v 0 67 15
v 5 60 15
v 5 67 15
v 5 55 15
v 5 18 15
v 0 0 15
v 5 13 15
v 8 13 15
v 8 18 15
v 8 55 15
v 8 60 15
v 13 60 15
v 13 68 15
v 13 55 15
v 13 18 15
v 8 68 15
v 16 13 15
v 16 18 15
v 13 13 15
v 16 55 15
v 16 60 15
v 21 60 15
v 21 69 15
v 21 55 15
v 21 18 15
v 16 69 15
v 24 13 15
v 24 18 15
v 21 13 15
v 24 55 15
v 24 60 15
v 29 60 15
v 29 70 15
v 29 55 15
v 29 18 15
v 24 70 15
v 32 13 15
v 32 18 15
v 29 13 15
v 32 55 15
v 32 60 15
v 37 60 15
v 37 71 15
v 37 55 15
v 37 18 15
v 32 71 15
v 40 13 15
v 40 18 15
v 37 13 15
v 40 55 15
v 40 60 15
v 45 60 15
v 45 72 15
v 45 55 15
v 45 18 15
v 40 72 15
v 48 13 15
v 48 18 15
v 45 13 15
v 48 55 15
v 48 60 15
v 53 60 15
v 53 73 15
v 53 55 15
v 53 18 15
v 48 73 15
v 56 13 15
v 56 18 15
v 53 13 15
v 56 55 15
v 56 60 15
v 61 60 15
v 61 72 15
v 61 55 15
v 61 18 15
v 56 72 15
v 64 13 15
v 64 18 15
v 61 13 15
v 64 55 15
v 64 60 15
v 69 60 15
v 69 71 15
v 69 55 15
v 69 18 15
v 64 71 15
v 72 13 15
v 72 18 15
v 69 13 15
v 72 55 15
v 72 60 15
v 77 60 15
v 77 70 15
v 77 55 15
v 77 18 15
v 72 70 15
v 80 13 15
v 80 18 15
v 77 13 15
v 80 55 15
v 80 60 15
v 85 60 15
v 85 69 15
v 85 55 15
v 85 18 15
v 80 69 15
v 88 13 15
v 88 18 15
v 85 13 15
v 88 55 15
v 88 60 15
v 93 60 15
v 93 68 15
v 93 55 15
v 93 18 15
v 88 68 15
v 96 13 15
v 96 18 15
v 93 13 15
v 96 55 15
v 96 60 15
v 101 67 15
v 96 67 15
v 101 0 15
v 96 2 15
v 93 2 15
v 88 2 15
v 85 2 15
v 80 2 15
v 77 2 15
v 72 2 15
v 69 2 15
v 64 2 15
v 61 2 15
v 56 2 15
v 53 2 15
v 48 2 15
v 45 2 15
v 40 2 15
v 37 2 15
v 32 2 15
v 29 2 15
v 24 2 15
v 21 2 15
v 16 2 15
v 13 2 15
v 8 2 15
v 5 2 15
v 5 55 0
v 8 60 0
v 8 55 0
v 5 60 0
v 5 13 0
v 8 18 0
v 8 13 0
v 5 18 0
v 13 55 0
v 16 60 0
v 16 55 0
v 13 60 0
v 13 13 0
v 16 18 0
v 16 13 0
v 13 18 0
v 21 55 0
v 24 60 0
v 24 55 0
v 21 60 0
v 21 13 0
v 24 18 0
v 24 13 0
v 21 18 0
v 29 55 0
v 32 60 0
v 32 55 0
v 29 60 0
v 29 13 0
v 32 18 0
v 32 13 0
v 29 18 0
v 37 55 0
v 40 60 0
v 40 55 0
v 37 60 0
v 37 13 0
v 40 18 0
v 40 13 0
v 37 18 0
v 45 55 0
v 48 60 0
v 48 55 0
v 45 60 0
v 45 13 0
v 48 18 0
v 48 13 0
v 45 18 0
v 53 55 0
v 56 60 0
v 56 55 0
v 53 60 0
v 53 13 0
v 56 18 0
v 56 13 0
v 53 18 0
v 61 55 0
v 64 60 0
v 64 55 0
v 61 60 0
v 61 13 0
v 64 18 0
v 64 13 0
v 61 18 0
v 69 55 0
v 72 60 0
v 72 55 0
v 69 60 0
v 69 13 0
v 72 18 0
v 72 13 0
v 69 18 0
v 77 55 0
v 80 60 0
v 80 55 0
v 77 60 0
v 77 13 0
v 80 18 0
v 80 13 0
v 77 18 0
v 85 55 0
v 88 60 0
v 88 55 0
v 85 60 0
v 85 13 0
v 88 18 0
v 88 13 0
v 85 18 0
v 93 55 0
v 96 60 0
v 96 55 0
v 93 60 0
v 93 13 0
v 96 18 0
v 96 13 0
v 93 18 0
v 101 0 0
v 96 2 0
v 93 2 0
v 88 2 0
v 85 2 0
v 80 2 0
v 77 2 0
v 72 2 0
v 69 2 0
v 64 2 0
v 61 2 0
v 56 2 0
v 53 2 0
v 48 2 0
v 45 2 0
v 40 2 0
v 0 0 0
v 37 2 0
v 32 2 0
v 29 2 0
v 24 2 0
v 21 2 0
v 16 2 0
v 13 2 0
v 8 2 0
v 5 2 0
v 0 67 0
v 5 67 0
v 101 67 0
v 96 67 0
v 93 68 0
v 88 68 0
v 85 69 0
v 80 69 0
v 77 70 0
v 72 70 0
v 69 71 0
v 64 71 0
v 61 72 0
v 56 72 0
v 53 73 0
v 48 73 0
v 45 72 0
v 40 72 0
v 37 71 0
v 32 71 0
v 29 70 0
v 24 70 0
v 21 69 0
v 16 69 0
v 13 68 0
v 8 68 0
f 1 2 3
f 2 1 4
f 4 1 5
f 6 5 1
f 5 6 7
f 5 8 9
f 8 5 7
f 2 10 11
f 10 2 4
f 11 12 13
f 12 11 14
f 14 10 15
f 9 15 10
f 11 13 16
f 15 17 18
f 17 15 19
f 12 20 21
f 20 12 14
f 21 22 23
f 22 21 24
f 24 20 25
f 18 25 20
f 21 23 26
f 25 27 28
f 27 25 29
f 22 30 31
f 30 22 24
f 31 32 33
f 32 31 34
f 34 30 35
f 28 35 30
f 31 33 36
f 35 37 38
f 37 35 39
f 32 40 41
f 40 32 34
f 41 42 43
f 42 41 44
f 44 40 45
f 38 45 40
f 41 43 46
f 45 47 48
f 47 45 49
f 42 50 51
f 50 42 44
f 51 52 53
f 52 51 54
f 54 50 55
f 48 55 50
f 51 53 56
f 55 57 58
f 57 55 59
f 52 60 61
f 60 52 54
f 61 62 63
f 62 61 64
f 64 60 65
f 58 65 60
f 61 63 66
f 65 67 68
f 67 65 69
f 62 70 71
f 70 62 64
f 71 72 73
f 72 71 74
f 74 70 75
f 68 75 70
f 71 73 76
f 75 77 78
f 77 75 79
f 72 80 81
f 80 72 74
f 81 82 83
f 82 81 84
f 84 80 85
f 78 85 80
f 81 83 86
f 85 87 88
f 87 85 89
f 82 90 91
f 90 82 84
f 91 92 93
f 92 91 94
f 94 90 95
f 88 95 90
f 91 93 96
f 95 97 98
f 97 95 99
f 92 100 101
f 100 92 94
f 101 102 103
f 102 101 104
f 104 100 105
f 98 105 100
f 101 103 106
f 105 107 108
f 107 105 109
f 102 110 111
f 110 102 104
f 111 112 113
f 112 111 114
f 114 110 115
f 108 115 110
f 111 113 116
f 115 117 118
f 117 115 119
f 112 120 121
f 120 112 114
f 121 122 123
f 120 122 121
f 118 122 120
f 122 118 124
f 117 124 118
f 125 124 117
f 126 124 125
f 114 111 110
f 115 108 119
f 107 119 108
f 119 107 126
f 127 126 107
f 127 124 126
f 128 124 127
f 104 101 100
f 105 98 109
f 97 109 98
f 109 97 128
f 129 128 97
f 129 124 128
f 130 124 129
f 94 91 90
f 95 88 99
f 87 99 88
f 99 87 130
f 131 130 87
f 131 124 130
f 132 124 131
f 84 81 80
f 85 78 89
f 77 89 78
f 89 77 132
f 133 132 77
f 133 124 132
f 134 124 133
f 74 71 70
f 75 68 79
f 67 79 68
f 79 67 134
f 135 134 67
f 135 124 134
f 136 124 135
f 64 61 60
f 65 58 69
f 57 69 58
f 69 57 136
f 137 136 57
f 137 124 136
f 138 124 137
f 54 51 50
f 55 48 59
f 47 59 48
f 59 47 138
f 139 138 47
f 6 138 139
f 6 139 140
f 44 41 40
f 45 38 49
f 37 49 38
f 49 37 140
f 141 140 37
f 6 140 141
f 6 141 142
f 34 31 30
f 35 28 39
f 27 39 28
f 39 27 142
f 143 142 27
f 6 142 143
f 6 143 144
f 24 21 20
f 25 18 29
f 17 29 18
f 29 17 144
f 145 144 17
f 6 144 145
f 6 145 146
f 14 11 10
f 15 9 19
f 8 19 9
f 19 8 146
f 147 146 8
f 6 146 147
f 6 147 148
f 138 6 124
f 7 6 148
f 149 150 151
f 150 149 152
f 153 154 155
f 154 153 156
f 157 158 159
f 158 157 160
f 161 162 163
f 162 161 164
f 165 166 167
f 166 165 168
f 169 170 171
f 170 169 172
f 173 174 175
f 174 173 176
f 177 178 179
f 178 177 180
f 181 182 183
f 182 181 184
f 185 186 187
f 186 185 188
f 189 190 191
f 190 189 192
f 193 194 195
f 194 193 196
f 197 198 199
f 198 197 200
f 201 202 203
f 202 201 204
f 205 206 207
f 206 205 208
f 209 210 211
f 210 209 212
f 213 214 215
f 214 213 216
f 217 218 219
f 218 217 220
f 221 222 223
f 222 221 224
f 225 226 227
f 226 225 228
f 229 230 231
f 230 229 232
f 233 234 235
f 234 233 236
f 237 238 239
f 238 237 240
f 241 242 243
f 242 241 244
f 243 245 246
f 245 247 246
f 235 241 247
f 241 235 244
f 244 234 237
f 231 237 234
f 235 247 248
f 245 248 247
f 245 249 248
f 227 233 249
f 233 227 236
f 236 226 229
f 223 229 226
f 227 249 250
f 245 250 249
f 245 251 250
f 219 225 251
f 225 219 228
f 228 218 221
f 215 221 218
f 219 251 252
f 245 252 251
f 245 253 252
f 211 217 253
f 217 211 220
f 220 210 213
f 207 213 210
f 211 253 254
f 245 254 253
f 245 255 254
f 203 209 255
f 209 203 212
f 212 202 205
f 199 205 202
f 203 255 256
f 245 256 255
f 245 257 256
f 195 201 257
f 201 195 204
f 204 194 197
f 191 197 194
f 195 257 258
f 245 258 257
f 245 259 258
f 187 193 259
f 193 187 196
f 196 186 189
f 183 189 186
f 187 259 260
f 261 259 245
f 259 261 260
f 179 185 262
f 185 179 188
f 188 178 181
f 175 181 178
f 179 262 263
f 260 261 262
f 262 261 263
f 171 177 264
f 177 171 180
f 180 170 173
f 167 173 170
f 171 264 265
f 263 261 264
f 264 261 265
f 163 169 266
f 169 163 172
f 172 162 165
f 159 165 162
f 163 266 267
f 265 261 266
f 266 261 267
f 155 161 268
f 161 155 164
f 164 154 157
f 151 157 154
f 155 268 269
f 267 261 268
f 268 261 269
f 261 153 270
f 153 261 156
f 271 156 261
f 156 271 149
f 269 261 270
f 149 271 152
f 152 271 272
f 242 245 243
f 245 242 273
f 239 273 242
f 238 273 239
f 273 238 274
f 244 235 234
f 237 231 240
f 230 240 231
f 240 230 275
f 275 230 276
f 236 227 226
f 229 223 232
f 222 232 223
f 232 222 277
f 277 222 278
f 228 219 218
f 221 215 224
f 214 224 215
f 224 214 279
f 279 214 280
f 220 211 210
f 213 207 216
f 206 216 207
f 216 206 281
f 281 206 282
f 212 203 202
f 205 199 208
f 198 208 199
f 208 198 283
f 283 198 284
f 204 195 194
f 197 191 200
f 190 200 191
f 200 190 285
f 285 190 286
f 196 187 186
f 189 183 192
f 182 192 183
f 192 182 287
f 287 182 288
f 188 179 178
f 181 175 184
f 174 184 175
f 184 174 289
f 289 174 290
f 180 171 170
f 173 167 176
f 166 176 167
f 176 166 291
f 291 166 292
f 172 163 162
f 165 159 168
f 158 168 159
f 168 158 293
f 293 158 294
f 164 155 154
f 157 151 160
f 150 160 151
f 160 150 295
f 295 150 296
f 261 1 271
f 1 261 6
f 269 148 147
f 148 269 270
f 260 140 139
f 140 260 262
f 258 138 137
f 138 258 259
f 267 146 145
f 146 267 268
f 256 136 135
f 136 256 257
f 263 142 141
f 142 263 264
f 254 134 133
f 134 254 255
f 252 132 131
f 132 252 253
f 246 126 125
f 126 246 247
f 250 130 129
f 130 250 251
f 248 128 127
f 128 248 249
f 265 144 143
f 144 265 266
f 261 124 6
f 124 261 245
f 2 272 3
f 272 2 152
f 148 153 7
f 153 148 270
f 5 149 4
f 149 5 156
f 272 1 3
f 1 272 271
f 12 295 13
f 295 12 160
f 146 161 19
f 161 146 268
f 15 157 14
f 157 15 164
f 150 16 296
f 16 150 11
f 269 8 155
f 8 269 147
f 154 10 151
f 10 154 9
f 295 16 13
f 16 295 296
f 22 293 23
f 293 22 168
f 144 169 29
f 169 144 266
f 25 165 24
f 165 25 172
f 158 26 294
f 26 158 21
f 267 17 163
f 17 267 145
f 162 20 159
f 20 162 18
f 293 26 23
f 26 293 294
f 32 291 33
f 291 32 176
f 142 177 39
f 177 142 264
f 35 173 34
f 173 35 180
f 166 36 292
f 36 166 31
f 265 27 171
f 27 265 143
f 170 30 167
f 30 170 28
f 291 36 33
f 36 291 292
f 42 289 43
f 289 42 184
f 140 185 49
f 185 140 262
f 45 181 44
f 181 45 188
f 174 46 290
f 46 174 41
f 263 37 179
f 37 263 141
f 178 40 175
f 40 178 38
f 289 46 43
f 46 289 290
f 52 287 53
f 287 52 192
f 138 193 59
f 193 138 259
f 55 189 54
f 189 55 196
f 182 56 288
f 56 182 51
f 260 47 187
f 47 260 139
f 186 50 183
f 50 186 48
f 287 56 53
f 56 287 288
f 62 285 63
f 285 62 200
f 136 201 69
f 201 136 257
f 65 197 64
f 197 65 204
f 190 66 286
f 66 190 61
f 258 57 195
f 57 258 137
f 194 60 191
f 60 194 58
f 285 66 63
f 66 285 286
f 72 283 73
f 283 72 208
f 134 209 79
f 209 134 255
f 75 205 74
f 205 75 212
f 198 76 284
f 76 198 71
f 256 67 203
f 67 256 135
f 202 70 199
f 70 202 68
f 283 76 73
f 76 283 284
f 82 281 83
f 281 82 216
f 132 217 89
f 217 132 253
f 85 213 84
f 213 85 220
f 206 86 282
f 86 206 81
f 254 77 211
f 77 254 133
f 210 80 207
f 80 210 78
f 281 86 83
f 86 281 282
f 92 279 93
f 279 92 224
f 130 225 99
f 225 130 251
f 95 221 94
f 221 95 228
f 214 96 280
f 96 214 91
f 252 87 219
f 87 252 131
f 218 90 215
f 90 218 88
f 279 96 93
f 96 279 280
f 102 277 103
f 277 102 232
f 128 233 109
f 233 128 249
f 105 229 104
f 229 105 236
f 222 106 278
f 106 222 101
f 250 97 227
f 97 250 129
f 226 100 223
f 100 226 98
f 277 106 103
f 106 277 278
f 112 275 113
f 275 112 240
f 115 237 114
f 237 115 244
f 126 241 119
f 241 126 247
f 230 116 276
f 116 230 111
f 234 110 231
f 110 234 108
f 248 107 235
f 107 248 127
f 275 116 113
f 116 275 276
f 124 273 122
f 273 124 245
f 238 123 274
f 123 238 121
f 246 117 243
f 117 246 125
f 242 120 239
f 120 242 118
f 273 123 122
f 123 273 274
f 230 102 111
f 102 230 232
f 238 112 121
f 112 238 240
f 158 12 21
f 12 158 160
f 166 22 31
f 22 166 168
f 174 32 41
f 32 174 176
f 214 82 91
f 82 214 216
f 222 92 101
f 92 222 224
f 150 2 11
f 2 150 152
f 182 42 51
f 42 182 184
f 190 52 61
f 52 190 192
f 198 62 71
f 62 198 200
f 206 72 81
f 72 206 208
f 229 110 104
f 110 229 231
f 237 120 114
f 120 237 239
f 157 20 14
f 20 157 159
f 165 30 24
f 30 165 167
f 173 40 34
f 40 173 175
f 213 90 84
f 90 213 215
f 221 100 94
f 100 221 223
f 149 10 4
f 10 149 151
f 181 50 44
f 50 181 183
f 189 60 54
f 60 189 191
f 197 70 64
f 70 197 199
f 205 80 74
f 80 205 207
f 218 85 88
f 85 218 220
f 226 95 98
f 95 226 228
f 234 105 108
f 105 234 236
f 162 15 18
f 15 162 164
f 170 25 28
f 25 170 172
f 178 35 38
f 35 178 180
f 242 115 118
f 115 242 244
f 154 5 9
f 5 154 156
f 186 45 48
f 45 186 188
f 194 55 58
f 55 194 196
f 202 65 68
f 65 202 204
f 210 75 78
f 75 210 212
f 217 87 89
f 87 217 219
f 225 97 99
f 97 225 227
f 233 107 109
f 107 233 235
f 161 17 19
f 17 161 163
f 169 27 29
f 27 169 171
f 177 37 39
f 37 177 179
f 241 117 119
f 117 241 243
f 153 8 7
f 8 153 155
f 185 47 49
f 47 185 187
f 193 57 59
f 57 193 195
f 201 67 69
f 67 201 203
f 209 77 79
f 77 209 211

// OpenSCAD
// Забор by @Karimov_Sheroz

cube([100, 2, 15]); color([0.56,0.23,0])  // параллелепипед со сторонами 100,2,15  мм
cube([100, 2, 15]); color([0.56,0.23,0])  // параллелепипед со сторонами 100,2,15  мм  
  translate([0,0,0]) cube([5, 67, 15]); color([0.56,0.23,0])  // параллелепипед со сторонами 5, 67, 15  мм
translate([8,0,0]) cube([5, 68, 15]); color([0.56,0.23,0])  //параллелепипед со сторонами 5, 68, 15  мм
translate([16,0,0]) cube([5, 69, 15]); color([0.56,0.23,0])  // параллелепипед со сторонами 5, 69, 15  мм 
translate([24,0,0]) cube([5, 70, 15]); color([0.56,0.23,0])  // параллелепипед со сторонами 5, 70, 15  мм  
translate([32,0,0]) cube([5, 71, 15]); color([0.56,0.23,0])   //параллелепипед со сторонами 5, 71, 15  мм
  translate([40,0,0]) cube([5, 72, 15]); color([0.56,0.23,0])  //параллелепипед со сторонами 5, 72, 15  мм
translate([48,0,0]) cube([5, 73, 15]); color([0.56,0.23,0])  //параллелепипед со сторонами 5, 73, 15  мм
 translate([56,0,0]) cube([5, 72, 15]); color([0.56,0.23,0])  //параллелепипед со сторонами 5, 72, 15  мм
 translate([64,0,0]) cube([5, 71, 15]); color([0.56,0.23,0])  //параллелепипед со сторонами 5, 71, 15  мм
translate([72,0,0]) cube([5, 70, 15]); color([0.56,0.23,0])  //параллелепипед со сторонами 5, 70, 15  мм 
translate([80,0,0]) cube([5, 69, 15]); color([0.56,0.23,0])  //параллелепипед со сторонами 5, 69, 15  мм
translate([88,0,0]) cube([5, 68, 15]); color([0.56,0.23,0])  //параллелепипед со сторонами 5, 68, 15  мм
translate([96,0,0]) cube([5, 67, 15]);  // параллелепипед со сторонами 5, 67, 15 мм 
cube([100, 2, 15]);  //параллелепипед со сторонами 100,2,15  мм
translate([0,55,0]) cube([100, 5, 15]); color([0.56,0.23,0]) //параллелепипед со сторонами 100,5,15  мм
cube([100, 2, 15]);
translate([0,13,0]) cube([100, 5, 15]); //параллелепипед со сторонами 100,5,15  мм
